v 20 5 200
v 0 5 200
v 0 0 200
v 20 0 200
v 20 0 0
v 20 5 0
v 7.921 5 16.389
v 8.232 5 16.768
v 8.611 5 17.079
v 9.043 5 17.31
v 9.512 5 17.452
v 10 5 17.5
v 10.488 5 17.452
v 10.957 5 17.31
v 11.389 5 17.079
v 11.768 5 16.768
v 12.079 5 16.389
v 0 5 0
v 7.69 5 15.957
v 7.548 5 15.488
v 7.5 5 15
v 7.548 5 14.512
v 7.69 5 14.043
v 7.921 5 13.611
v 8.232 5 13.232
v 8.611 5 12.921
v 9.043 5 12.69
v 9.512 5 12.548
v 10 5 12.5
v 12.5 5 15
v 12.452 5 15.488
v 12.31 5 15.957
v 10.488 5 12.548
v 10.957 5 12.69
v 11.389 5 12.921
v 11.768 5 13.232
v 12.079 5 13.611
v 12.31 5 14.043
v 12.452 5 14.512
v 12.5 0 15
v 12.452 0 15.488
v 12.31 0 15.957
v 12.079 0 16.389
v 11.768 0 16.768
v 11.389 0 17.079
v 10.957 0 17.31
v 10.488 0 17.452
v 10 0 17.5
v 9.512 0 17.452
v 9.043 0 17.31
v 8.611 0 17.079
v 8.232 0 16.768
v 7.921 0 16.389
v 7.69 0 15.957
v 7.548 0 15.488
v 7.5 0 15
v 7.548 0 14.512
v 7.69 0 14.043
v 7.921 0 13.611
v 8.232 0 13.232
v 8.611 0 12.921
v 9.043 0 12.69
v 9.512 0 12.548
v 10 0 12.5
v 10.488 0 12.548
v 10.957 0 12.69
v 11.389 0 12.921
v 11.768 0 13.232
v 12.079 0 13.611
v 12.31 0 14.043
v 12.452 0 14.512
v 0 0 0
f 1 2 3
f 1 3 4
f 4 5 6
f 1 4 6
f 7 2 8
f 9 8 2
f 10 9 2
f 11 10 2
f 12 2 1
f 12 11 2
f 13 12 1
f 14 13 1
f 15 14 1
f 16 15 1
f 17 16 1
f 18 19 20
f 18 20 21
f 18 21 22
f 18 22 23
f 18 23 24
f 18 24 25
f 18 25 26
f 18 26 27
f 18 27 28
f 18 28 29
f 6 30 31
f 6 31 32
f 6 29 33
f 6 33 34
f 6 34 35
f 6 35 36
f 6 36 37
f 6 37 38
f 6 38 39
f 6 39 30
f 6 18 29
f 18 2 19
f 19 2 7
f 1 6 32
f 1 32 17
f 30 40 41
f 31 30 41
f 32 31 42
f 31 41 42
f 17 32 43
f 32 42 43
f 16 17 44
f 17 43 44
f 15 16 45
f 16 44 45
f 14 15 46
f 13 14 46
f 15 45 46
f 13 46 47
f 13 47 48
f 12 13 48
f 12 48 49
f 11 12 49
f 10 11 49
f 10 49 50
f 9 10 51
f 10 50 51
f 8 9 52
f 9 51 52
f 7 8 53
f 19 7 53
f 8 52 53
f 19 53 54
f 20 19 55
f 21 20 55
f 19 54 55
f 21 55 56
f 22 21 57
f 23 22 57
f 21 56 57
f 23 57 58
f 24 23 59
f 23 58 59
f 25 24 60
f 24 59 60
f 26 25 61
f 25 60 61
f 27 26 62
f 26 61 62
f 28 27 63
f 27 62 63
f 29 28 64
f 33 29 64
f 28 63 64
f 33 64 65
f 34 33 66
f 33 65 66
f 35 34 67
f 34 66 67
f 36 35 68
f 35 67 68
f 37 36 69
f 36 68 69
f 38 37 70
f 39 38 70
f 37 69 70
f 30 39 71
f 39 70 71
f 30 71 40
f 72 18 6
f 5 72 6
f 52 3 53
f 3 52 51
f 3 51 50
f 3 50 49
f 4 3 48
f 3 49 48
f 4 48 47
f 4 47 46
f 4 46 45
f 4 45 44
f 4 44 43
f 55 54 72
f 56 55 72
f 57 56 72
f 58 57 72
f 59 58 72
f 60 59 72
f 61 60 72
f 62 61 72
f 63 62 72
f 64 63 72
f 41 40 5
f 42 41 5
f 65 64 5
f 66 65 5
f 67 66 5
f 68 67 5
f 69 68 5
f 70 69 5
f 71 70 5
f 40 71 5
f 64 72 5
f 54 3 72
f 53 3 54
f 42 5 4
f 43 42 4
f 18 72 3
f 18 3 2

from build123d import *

# Parameters (mm, degrees)
BOX_W        = 20
BOX_H        = 5
BOX_DEPTH    = 200
SKETCH_R     = 2.5
POCKET_DEPTH = 5


with BuildPart() as part:
    # Box → Box (new body)
    with BuildSketch(Plane.XY):
        with Locations((10, 2.5)):
            Rectangle(BOX_W, BOX_H)
    extrude(amount=BOX_DEPTH)

    # Sketch (on Face3 of Box) → Pocket (cut)
    with BuildSketch(Plane.XZ):
        with Locations((10, 15)):
            Circle(SKETCH_R)
    extrude(amount=-POCKET_DEPTH, mode=Mode.SUBTRACT)


solid = part.part
